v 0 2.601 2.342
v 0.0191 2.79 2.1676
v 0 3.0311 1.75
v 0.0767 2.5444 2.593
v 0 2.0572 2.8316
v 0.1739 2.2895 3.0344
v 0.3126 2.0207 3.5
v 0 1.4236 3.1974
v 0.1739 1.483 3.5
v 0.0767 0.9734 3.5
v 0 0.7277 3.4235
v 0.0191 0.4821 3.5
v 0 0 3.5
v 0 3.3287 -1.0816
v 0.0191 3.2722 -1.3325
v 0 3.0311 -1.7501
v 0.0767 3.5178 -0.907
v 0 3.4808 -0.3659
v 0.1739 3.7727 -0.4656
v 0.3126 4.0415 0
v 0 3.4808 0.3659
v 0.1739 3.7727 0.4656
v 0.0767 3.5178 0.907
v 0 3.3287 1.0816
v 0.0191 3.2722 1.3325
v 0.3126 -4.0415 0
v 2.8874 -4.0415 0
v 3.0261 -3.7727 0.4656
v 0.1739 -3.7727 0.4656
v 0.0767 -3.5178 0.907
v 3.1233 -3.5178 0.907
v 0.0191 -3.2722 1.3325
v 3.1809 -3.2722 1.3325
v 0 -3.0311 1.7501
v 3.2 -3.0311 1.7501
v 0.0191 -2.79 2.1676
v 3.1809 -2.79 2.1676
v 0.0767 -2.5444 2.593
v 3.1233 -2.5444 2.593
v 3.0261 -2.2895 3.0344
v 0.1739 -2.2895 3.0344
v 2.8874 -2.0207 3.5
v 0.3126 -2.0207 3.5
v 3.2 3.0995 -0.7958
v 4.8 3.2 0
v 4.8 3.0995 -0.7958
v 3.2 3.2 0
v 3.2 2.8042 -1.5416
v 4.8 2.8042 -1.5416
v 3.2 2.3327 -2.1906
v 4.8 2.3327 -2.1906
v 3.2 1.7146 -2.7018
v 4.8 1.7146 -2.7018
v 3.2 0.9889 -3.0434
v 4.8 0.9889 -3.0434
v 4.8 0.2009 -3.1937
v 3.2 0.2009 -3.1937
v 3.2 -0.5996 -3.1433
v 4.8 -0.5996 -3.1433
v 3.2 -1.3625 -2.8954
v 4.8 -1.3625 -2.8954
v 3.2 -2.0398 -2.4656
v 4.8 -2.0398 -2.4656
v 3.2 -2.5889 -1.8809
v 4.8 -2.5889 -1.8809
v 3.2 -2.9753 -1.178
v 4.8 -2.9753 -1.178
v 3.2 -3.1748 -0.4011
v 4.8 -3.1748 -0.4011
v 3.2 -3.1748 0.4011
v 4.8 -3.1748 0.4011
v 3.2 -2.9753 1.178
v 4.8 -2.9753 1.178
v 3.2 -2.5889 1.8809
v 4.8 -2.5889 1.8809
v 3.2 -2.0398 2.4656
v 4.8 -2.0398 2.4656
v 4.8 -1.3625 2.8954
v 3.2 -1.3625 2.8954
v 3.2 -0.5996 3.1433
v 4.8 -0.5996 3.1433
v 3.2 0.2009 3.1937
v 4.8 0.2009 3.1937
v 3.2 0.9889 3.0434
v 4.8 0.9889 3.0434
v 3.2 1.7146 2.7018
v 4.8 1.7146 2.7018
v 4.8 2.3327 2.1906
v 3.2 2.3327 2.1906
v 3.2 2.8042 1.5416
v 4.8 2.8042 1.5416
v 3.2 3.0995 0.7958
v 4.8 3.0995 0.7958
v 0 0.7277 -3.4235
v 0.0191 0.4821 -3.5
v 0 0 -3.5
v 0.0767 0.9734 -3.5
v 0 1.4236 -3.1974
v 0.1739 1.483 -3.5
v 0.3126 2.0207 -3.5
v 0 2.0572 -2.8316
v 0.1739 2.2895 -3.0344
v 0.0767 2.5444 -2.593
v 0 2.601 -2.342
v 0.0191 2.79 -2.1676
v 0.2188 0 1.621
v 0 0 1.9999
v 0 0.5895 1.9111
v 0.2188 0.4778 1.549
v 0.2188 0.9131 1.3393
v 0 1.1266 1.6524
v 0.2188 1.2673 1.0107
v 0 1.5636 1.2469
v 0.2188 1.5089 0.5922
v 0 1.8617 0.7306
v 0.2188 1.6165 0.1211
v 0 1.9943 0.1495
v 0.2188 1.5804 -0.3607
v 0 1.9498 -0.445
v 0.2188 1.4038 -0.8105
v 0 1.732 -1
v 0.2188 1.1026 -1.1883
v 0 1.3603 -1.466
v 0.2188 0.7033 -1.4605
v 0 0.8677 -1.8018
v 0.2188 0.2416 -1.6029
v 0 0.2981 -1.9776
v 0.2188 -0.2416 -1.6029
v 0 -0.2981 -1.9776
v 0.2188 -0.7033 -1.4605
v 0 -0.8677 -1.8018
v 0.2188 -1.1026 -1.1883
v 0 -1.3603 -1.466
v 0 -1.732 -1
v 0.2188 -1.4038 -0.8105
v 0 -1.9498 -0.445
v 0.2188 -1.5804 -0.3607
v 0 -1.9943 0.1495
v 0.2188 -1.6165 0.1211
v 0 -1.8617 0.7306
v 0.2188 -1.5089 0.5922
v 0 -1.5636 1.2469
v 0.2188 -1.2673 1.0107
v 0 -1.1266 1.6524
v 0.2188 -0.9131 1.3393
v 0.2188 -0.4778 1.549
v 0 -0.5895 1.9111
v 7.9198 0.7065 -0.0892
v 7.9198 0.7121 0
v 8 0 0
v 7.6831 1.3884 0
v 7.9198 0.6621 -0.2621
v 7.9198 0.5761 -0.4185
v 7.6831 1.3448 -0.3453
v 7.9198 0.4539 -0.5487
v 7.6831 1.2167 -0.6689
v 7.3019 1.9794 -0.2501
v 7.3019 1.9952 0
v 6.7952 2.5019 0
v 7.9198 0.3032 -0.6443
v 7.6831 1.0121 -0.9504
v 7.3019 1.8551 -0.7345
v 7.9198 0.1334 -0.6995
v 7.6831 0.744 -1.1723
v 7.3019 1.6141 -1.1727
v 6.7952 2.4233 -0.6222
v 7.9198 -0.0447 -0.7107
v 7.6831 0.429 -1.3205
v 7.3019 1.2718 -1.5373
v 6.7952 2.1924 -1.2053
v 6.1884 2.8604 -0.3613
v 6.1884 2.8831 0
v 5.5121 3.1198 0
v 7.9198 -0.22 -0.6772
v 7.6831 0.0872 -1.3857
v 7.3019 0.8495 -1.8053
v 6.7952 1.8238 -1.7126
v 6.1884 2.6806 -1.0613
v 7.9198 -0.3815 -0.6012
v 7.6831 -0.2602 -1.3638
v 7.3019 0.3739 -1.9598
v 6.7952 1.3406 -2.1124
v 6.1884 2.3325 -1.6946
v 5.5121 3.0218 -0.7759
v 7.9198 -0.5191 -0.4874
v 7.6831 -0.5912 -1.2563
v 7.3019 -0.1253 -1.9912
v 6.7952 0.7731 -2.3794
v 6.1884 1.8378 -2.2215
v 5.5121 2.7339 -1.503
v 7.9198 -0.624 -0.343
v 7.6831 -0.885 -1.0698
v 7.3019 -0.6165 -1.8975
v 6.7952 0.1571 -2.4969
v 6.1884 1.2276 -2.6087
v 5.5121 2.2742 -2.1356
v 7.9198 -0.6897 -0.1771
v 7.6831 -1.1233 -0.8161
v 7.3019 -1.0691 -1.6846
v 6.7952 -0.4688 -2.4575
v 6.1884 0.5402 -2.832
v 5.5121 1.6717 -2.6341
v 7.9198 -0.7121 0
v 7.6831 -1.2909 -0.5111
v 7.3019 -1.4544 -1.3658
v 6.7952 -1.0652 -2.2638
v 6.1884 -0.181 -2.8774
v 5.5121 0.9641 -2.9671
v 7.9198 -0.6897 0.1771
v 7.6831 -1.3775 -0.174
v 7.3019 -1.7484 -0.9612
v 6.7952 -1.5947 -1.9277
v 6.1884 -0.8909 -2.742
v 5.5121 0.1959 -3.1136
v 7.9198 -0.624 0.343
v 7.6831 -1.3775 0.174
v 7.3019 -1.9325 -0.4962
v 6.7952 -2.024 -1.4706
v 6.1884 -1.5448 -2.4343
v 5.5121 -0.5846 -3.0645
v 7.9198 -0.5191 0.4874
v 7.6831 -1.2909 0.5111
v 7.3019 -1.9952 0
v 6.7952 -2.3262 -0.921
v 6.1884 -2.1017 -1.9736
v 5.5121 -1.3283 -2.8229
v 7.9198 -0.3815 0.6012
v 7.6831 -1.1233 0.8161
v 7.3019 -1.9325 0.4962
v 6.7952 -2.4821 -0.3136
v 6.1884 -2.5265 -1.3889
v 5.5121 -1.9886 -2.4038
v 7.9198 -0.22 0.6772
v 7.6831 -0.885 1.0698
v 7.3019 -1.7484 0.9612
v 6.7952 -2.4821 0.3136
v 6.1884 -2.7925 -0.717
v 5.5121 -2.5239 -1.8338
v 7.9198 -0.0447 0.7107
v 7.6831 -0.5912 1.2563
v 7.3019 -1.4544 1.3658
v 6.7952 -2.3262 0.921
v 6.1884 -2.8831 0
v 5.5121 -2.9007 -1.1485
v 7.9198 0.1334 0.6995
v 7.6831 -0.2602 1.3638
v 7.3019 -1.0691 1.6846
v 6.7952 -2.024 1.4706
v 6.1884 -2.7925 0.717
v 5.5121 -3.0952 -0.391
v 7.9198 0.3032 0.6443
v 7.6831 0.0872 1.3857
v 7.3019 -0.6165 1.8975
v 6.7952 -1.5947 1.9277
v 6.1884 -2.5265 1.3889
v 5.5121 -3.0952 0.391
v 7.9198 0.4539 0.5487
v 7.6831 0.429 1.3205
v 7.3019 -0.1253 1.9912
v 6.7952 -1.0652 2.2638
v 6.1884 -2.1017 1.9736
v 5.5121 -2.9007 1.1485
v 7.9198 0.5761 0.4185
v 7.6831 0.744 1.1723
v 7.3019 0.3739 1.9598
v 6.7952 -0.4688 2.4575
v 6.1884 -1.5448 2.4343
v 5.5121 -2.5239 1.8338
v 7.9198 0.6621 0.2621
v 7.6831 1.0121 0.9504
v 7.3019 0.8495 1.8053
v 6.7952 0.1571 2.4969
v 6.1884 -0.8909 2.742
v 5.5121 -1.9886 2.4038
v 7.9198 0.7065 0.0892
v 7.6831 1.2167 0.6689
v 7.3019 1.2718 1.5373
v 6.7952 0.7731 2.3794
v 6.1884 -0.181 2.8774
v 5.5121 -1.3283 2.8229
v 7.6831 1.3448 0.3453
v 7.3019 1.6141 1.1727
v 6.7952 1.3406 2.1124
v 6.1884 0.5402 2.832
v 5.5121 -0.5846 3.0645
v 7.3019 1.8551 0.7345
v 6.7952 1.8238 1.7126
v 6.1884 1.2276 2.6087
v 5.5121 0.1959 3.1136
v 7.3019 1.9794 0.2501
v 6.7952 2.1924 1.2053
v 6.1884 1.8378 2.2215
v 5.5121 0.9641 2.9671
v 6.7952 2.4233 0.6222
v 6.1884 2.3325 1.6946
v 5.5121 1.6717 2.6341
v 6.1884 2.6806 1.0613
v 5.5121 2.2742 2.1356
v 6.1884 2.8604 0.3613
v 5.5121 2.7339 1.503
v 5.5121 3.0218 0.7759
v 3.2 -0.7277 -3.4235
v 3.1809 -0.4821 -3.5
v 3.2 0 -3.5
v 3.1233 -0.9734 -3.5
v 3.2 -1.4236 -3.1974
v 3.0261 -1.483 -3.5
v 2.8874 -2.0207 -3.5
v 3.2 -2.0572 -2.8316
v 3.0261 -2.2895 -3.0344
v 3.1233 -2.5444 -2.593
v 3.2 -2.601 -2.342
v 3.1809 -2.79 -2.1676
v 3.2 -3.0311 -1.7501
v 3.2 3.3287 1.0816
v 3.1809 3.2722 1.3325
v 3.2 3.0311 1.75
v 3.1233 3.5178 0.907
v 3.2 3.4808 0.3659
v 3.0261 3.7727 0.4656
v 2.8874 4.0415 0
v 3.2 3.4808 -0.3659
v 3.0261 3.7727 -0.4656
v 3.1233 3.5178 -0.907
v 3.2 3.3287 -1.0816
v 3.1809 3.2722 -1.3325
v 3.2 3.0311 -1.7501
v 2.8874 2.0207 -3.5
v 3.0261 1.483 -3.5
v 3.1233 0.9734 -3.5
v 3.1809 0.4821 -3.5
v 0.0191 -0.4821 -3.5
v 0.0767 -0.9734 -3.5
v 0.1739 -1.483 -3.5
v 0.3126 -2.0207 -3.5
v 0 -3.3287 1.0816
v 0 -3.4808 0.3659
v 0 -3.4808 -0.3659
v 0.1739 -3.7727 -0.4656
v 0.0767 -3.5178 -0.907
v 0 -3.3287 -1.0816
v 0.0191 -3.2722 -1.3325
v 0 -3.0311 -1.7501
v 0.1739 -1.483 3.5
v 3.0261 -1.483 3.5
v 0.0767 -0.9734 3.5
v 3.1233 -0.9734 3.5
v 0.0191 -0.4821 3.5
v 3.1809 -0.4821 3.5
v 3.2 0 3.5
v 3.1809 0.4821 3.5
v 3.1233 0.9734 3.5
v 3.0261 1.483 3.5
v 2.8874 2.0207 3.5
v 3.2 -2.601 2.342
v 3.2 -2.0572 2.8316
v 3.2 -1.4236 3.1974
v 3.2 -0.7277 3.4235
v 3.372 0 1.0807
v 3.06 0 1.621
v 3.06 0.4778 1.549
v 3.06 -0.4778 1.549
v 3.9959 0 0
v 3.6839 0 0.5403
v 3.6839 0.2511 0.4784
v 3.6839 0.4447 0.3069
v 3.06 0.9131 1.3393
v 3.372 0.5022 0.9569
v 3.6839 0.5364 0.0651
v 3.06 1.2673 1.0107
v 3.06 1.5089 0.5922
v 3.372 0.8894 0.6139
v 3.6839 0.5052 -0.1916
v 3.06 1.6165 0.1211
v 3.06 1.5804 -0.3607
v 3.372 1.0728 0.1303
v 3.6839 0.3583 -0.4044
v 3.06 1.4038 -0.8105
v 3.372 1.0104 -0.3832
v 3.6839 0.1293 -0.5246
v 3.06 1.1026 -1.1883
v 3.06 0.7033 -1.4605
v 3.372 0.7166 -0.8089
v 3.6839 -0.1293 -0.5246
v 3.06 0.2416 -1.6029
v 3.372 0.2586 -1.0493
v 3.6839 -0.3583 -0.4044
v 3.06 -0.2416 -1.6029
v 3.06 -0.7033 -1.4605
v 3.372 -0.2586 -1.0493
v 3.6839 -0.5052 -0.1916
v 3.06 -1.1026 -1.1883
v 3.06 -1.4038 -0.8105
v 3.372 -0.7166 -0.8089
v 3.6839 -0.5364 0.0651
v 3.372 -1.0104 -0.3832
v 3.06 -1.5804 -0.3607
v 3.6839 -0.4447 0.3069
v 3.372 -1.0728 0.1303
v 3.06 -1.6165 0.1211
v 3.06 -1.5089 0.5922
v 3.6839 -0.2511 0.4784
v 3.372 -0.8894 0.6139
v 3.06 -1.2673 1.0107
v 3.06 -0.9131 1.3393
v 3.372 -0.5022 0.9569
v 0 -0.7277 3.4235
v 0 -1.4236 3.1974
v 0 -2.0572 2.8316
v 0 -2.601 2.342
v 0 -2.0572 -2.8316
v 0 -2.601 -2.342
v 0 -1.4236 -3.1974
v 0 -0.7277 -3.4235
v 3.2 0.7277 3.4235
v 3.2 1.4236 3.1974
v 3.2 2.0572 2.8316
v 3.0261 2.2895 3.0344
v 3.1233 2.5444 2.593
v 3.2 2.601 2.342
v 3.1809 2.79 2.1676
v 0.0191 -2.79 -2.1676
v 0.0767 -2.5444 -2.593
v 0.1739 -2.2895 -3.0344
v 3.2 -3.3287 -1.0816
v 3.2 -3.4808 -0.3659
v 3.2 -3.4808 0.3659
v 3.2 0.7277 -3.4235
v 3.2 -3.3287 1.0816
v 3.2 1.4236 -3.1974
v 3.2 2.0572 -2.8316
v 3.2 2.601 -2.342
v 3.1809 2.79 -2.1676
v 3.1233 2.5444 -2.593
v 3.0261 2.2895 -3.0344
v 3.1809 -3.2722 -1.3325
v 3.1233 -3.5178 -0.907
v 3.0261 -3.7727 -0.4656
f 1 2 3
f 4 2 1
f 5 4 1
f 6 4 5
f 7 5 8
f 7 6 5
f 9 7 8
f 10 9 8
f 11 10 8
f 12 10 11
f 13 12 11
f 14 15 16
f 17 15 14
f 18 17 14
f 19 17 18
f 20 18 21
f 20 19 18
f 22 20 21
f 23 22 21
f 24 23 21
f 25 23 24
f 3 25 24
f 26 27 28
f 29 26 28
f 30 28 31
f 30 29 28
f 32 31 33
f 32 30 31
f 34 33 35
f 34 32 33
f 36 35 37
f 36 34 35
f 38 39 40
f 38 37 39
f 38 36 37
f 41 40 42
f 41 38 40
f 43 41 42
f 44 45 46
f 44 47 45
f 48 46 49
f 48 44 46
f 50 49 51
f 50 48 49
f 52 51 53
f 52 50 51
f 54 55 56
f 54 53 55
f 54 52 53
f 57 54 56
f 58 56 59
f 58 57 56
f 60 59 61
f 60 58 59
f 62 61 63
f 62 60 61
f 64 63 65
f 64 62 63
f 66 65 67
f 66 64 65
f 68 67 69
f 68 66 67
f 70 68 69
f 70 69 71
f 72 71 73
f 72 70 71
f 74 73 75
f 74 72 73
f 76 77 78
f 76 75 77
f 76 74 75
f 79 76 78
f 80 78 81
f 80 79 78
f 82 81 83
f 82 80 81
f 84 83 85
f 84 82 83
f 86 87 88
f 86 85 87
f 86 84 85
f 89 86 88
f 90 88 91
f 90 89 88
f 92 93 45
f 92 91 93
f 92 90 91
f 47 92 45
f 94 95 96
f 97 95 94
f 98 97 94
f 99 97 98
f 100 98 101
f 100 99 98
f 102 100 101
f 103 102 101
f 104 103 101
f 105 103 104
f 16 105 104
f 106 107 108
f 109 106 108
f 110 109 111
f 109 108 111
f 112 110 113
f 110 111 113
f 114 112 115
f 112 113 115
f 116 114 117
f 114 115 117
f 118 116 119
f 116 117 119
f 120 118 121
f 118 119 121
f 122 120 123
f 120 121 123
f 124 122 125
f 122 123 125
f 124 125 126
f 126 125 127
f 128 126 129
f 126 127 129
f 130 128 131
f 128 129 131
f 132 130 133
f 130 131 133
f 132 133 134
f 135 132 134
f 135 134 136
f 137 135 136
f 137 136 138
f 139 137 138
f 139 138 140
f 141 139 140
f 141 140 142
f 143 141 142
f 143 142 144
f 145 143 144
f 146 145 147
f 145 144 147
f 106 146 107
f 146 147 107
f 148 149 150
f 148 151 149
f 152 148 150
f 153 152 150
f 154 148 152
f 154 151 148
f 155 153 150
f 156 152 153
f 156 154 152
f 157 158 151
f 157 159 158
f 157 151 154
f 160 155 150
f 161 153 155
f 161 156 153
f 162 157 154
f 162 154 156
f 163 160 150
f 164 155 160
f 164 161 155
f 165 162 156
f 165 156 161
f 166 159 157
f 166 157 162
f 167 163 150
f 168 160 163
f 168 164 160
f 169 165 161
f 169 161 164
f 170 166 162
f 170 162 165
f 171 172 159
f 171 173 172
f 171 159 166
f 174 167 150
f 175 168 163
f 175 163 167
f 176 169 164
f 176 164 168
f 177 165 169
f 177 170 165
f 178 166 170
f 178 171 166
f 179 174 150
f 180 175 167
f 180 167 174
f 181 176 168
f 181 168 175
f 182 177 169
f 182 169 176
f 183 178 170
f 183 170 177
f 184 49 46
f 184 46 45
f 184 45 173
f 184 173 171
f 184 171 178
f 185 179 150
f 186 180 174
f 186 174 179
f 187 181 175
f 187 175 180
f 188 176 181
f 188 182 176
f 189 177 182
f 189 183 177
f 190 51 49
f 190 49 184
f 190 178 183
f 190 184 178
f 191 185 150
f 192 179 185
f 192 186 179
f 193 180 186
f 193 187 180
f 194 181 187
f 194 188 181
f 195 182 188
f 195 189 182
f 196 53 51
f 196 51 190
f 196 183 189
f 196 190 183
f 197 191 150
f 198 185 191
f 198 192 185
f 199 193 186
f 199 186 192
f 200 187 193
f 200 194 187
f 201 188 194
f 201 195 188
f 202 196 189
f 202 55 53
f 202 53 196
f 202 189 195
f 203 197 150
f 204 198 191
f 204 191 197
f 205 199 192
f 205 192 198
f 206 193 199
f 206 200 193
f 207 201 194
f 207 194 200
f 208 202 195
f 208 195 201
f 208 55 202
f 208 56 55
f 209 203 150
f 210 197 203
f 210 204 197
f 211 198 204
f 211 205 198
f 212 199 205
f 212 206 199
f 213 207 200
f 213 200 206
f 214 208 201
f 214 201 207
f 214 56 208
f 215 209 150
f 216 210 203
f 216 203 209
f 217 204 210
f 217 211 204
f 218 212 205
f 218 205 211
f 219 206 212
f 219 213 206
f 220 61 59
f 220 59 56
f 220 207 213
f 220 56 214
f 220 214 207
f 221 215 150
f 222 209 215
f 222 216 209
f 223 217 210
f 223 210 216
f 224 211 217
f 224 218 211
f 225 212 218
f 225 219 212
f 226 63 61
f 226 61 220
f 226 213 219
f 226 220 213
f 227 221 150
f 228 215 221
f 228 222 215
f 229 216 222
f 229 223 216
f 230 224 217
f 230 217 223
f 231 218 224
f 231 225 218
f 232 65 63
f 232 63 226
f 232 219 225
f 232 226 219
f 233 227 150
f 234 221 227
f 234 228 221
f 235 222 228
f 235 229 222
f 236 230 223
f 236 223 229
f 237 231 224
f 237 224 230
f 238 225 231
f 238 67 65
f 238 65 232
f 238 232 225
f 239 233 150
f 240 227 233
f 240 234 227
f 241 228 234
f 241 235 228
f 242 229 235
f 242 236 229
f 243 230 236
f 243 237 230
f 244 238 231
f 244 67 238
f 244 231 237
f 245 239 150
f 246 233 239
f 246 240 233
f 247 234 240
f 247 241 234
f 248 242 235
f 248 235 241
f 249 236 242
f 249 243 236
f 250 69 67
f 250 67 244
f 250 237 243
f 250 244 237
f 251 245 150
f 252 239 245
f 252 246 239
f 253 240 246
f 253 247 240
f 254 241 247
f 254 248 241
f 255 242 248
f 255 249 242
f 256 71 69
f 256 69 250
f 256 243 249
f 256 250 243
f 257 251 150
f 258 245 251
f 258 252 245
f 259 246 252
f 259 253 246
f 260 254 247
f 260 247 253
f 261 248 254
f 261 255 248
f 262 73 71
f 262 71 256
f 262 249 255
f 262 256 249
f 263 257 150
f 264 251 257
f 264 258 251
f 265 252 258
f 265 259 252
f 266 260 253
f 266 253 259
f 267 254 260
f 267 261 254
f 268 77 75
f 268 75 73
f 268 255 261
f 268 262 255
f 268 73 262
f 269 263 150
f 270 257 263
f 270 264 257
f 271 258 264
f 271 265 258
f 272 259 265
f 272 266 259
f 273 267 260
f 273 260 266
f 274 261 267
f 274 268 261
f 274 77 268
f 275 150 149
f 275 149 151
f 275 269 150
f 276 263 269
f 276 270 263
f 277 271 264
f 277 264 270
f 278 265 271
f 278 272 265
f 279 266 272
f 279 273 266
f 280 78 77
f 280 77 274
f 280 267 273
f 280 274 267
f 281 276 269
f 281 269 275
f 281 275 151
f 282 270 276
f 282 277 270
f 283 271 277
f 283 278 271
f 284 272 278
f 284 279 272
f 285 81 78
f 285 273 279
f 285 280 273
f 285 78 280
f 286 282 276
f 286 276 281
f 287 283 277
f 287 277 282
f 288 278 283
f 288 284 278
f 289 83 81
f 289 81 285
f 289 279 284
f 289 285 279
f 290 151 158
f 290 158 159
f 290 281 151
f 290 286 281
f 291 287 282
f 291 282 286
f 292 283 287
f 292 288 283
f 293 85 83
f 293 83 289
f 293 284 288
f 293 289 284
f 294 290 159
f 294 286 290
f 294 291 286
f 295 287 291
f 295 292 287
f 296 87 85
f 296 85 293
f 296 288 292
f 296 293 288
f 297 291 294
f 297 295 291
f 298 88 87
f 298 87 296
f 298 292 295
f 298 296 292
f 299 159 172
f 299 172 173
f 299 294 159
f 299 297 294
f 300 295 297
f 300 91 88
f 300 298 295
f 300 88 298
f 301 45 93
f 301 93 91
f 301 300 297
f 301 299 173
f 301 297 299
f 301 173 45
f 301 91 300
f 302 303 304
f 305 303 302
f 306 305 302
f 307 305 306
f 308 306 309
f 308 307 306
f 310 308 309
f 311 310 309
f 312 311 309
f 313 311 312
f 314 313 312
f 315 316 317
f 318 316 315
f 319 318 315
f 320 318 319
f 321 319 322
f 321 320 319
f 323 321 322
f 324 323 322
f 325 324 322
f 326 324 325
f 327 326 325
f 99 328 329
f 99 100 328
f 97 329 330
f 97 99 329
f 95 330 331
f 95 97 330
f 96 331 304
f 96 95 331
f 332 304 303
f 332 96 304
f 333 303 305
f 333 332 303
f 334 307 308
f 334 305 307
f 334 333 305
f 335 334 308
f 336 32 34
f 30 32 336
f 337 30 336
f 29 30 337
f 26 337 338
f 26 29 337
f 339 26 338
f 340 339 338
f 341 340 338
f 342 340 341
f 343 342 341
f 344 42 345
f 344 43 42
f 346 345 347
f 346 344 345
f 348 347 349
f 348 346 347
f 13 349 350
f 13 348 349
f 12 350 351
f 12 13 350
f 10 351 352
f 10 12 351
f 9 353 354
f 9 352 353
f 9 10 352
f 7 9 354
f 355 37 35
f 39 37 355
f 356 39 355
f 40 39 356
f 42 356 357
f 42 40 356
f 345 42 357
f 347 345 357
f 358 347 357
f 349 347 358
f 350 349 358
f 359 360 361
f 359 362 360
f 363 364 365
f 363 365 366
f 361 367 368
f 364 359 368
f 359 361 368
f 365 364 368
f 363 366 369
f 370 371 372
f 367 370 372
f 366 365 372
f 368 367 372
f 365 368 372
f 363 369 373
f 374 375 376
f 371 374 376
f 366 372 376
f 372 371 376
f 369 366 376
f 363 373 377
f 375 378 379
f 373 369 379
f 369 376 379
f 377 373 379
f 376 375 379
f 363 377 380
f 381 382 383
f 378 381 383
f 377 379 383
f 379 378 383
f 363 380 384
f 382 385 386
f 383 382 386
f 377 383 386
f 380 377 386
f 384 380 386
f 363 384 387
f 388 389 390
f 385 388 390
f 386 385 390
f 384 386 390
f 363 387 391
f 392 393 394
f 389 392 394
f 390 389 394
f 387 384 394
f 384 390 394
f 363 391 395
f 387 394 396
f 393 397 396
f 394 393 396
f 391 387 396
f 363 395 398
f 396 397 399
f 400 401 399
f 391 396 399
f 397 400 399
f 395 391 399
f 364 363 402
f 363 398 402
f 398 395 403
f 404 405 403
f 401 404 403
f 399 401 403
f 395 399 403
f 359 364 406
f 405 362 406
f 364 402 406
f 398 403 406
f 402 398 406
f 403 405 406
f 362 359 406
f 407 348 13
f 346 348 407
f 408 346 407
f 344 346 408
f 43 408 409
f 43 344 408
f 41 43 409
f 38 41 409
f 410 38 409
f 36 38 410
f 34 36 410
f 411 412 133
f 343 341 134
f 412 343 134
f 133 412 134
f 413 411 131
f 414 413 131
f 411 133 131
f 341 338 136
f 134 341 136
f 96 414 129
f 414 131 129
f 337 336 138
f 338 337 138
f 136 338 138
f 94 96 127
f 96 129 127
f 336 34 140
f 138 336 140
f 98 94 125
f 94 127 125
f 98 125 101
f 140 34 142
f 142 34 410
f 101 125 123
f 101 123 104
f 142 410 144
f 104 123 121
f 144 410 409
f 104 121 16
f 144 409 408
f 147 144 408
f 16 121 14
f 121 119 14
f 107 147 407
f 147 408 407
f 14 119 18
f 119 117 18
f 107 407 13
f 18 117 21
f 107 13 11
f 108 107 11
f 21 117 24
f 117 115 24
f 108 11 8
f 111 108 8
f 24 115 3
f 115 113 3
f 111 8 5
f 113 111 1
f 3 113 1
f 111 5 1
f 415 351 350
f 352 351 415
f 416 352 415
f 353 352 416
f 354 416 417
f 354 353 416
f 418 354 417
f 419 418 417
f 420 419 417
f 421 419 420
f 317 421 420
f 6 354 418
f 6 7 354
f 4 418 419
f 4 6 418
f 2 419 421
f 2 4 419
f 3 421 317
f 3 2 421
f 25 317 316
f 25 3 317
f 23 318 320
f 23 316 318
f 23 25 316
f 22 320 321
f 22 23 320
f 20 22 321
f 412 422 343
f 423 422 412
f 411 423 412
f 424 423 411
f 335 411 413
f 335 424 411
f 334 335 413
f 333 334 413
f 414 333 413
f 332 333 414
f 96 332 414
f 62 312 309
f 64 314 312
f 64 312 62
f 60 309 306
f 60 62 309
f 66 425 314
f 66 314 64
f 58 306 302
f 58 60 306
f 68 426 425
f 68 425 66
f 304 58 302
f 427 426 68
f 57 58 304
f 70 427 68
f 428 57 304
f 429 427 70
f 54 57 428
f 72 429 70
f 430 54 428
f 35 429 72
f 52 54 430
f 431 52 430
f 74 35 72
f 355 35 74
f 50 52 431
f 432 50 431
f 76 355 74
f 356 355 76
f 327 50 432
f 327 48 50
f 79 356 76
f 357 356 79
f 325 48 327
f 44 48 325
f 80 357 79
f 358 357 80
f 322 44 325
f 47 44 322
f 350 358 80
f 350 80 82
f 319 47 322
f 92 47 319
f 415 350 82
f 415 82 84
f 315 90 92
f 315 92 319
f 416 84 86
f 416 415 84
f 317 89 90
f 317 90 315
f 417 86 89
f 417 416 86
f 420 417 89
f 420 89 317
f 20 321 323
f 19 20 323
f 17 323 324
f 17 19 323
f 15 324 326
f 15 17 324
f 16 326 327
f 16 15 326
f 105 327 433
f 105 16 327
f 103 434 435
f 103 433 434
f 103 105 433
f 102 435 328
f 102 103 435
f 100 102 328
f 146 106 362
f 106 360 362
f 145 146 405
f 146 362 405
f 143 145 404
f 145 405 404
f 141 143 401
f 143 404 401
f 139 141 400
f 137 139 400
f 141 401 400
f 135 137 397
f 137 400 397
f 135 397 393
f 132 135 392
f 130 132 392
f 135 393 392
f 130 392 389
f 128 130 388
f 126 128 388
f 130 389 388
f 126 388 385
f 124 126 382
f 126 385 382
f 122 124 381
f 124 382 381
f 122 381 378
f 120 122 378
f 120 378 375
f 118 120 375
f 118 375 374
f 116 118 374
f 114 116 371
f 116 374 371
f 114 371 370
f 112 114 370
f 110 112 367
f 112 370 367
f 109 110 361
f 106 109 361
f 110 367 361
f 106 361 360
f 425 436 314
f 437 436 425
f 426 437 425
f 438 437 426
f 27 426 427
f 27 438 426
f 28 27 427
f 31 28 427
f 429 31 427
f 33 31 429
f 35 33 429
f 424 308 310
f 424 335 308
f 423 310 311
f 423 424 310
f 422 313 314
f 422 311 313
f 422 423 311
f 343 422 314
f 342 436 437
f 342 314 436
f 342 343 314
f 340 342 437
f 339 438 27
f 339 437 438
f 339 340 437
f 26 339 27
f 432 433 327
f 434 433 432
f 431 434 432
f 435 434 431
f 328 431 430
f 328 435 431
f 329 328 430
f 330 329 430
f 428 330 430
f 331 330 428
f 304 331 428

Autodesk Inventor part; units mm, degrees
ref_plane "YZ Plane" through (0, 0, 0) normal (1, 0, 0) x (0, 1, 0)
ref_plane "XZ Plane" through (0, 0, 0) normal (0, 1, 0) x (-1, 0, 0)
sketch "Эскиз1" plane through (0, 0, 0) normal (1, 0, 0) x (0, 1, 0)
  line L0 (-2.0207, -3.5) -> (-4.0415, 0)
  line L1 (-4.0415, 0) -> (-2.0207, 3.5)
  line L2 (-2.0207, 3.5) -> (2.0207, 3.5)
  line L3 (2.0207, 3.5) -> (4.0415, 0)
  line L4 (4.0415, 0) -> (2.0207, -3.5)
  line L5 (2.0207, -3.5) -> (-2.0207, -3.5)
  point P0 (0, 0)
  point P1 (0, 0)
  dimension "d0" = 8.0829
extrude "Базовый элемент" add sketch "Эскиз1" along normal blind 3.2
sketch "Эскиз2" plane through (0, 0, 0) normal (0, 0, 1) x (1, 0, 0)
  line L0 (3.2, 0) -> (8, 0)
  arc A0 (8, 0) -> (4.8, 3.2) centre (4.8, 0) ccw
  line L1 (4.8, 3.2) -> (3.2, 3.2)
  line L2 (3.2, -2.0207) -> (3.2, 2.0207) projected
  line L3 (3.2, 0) -> (3.2, 3.2)
  line L4 (2.1075, 0) -> (9.7553, 0) projected
  dimension "d8" = 3.2
  dimension "d9" = 4.8
revolve "Наконечник" add sketch "Эскиз2" angle 360 about axis through (3.2, 0, 0) along (1, 0, 0)
sketch "Эскиз3" plane through (0, 0, 0) normal (-1, 0, 0) x (0, 0, 1)
  line L0 (0, -5.658) -> (0, 5.658) projected
  line L1 (-4.9, 0) -> (4.9, 0) projected
  point P0 (0, 0)
hole "Резьба" at (0, 0, 0) direction (1, 0, 0) diameter 3.242 depth 3.06 tip angle 120 thread size "M4x0.7" class "6H" standard "ISO Metric profile"
sketch "Эскиз4" plane through (0, 0, 0) normal (0, 0, 1) x (1, 0, 0)
  line L0 (0, 2.0207) -> (0, 4.0415) projected
  line L1 (0, 4.0415) -> (3.2, 4.0415) projected
  line L2 (3.2, 2.0207) -> (3.2, 4.0415) projected
  line L3 (-0.64, 0) -> (3.84, 0) projected
  line L4 (0.3126, 4.0415) -> (0, 3.5)
  line L5 (2.8874, 4.0415) -> (3.2, 3.5)
  dimension "d3" = 7
  dimension "d4" = 30
  dimension "d5" = 7
  dimension "d6" = 30
revolve "Фаска1" cut sketch "Эскиз4" angle 360 about axis through (-10, 0, 0) along (1, 0, 0)
chamfer "Фаска2" distance 0.3789 angle 30 1 edges at (0, 0, -1.621) measured on face at (0, -2.8569, 0.0651)
ref_plane "Work Plane1" through (1.53, 0, 0) normal (0, 0.866, -0.5) x (-1, 0, 0)
equation "\"d0\" = 1.1547 * SW"
equation "\"d1\" = SIH"
equation "\"d8\" = KR"
equation "\"d9\" = KOH1 - SIH"
equation "\"d11\" = GEL"
equation "\"d12\" = 1.02 * GEL"
equation "\"d3\" = SW0"
equation "\"d4\" = ANG1"
equation "\"d5\" = SW01"
equation "\"d6\" = ANG2"
equation "\"d14\" = -0.5 * GD1 + 0.5 * NND"
equation "\"d36\" = -0.5 * GD1 + 0.5 * NND"
equation "\"ANG1\" = 30deg"
equation "\"ANG2\" = 30deg"
equation "\"NND\" = 4"
equation "\"SIH\" = 3.2"
equation "\"KOH1\" = 8"
equation "\"GEL\" = 3"
equation "\"SW\" = 7"
equation "\"KR\" = 3.2"
equation "\"SW0\" = SW"
equation "\"SW01\" = SW"
equation "\"GUL\" = 0.541266 * PTC"
equation "\"THREADDIA\" = 4"
equation "\"SDH\" = 6"
equation "\"TOA\" = 30deg"
equation "\"PTC\" = 0.7"
equation "\"E0\" = 1.155 * SW"
equation "\"GAL\" = 0.541266 * PTC"
equation "\"GD1\" = 3.242228"
properties part number "Гайка M4-6H ГОСТ 11860-85" material "Сталь, мягкая"
